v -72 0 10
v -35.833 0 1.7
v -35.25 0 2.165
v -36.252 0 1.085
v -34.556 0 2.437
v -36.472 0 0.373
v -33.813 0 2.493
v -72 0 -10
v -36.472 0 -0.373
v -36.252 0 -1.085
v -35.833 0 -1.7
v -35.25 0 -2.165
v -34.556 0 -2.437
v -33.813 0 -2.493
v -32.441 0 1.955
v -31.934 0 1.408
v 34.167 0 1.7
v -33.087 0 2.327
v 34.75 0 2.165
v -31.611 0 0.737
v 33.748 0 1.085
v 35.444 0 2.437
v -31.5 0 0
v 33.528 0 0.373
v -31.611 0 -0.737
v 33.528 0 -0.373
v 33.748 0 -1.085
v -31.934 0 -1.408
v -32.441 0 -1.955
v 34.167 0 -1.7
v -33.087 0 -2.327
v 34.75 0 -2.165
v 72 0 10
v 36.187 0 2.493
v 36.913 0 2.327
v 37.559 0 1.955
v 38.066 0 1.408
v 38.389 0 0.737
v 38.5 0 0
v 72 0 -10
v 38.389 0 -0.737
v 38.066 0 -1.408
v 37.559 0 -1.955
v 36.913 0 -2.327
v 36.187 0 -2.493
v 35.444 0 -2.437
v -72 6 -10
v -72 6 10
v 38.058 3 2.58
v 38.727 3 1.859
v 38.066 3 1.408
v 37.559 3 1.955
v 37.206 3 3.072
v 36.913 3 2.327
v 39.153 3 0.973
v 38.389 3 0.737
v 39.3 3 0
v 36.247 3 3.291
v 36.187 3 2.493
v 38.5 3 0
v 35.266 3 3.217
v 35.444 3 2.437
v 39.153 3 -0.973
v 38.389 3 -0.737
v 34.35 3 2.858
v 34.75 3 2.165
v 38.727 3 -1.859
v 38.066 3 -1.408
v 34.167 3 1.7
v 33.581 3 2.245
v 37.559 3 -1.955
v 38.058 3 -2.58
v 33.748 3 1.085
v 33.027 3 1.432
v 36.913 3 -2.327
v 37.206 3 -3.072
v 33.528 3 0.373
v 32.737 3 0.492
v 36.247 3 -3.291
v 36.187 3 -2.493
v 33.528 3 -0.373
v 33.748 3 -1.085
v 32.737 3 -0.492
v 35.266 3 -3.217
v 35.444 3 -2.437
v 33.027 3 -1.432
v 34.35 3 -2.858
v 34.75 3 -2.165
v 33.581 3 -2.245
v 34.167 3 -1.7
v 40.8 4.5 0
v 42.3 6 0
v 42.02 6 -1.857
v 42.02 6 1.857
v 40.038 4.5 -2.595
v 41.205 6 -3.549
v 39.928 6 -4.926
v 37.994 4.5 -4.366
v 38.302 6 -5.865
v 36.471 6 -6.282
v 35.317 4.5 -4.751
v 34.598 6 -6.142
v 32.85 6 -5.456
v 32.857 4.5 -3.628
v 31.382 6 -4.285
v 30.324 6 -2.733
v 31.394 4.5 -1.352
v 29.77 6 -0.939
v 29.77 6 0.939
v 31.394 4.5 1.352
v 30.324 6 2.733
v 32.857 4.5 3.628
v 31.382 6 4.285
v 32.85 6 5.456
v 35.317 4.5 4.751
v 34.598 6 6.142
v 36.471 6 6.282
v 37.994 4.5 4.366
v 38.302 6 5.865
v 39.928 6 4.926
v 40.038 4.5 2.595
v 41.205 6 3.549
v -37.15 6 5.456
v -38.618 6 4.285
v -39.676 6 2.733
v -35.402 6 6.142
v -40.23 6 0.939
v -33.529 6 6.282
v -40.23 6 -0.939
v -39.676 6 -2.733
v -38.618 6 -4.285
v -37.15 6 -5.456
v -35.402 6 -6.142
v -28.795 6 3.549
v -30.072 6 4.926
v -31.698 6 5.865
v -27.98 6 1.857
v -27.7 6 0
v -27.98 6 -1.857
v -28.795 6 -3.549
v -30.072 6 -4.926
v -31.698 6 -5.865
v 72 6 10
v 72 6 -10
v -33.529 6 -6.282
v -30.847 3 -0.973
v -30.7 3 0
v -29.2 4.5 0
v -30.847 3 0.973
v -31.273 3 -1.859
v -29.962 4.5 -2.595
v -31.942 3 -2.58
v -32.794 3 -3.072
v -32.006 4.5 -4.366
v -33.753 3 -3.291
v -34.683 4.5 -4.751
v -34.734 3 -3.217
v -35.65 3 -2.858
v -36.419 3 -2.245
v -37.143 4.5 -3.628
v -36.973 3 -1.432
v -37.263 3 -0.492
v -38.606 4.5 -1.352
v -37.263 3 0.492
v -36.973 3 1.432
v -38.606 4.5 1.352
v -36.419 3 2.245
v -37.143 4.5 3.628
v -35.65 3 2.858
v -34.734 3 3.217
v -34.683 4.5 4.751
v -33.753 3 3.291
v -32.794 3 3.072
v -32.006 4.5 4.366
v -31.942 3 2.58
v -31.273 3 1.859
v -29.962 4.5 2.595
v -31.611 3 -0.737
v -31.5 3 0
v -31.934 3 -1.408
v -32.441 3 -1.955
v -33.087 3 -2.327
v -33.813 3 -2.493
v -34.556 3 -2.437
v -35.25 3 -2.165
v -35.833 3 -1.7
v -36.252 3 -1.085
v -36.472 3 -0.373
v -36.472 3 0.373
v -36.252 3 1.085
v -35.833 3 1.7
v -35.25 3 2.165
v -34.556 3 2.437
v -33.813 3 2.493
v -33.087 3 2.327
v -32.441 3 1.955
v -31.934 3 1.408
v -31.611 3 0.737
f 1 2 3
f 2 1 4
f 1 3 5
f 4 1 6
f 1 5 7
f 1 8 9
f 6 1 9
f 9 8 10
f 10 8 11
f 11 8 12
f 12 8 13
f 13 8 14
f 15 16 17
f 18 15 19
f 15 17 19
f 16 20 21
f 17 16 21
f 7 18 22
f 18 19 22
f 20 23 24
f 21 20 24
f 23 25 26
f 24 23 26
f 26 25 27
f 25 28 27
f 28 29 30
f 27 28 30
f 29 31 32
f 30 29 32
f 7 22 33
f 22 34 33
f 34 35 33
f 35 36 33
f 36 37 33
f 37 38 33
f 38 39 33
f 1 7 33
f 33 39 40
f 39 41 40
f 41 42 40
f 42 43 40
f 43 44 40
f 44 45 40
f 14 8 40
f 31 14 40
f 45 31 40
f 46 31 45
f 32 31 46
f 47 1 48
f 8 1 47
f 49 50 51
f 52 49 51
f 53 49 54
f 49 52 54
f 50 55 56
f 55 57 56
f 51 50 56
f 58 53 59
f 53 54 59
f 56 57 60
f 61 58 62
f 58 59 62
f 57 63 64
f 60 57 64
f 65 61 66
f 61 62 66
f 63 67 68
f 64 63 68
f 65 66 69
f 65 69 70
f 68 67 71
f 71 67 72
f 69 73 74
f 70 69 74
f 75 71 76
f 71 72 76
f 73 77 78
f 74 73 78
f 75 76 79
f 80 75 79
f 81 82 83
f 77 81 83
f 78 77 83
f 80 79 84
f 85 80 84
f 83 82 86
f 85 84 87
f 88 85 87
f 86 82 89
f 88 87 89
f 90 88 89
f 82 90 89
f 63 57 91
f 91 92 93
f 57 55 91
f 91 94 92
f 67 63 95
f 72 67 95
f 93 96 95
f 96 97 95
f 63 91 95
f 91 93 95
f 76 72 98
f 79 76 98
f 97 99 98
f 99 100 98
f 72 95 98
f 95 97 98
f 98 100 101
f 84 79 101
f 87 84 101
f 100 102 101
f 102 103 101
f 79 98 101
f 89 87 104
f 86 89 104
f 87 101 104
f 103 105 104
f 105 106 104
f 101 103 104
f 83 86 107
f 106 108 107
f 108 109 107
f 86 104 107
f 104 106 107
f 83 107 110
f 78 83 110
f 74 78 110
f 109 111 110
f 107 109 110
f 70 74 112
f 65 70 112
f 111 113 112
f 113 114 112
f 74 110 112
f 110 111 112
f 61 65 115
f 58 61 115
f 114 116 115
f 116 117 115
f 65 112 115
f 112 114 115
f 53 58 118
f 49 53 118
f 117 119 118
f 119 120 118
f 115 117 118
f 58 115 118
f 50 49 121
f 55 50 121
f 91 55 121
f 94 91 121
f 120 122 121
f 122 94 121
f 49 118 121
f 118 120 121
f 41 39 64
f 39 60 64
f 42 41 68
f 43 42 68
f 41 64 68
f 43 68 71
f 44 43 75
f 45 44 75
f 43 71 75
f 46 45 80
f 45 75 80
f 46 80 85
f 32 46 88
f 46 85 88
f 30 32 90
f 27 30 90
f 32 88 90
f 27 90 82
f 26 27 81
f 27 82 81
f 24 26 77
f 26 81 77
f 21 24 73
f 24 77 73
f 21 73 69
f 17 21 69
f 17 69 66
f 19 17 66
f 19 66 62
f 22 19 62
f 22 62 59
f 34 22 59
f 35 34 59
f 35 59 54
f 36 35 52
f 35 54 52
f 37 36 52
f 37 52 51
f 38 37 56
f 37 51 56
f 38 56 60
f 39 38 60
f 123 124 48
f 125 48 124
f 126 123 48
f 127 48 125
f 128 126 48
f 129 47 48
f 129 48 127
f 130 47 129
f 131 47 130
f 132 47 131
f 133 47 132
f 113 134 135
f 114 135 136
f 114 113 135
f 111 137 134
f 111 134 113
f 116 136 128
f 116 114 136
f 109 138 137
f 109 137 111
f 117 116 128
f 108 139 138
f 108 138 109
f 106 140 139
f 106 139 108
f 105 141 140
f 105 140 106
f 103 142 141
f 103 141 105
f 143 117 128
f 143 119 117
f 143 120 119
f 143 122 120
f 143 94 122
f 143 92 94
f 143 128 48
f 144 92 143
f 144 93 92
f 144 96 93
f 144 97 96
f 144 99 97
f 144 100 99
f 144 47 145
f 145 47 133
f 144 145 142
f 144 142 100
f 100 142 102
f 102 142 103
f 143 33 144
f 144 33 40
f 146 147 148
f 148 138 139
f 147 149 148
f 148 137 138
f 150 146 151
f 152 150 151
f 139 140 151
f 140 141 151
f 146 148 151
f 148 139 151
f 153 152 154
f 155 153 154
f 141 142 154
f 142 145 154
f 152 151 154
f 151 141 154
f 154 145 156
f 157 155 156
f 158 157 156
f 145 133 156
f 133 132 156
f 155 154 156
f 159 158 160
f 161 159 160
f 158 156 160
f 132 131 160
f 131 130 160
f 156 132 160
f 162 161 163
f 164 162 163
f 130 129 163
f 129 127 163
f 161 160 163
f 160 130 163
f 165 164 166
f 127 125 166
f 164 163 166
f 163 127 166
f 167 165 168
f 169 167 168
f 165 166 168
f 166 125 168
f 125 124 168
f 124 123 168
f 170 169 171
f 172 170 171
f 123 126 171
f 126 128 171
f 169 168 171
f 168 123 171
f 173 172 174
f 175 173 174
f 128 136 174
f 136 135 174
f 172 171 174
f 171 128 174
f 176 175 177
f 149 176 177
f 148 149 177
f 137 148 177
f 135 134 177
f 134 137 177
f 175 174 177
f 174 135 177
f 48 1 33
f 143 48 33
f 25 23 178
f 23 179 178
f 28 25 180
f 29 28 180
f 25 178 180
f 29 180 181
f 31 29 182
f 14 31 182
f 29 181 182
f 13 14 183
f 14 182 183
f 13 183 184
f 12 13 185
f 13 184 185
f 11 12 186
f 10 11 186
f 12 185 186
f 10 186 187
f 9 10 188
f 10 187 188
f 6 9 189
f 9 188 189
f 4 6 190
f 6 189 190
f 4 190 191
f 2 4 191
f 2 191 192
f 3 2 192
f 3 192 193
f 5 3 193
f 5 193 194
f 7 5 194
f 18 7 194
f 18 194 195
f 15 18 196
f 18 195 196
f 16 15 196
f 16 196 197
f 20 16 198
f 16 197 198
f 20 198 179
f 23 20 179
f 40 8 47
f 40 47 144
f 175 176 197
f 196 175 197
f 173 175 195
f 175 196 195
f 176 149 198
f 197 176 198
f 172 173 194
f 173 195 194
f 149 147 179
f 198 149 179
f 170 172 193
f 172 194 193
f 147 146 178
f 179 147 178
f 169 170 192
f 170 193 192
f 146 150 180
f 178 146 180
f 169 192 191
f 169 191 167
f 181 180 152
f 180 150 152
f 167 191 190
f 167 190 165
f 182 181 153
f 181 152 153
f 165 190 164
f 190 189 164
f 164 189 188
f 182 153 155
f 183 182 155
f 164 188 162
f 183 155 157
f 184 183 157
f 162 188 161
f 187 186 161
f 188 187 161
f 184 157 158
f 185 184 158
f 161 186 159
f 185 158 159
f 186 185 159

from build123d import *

# Parameters (mm, degrees)
SKETCH1_W           = 144
SKETCH1_H           = 20
BOSS_EXTRUDE1_DEPTH = 6


# Read off the part's stored shape, not the designer's step: AdvancedHole1
with BuildPart() as part:
    # Sketch1 → Boss-Extrude1 (new body)
    with BuildSketch(Plane(origin=(0, 0, 0), x_dir=(1, 0, 0), z_dir=(0, 1, 0))):
        Rectangle(SKETCH1_W, SKETCH1_H)
    extrude(amount=BOSS_EXTRUDE1_DEPTH)

    # AdvancedHole1 outline → AdvancedHole1 (revolve, cut)
    with BuildSketch(Plane(origin=(36, 0, 0), x_dir=(1, 0, 0), z_dir=(0, 0, 1))):
        Polygon((0, 0), (2.5, 0), (2.5, 3), (3.3, 3), (6.3, 6), (0, 6), align=None)
    revolve(axis=Axis((36, 0, 0), (0, 1, 0)), mode=Mode.SUBTRACT)

    # AdvancedHole1 2 outline → AdvancedHole1 2 (revolve, cut)
    with BuildSketch(Plane(origin=(-34, 0, 0), x_dir=(1, 0, 0), z_dir=(0, 0, 1))):
        Polygon((6.3, 6), (0, 6), (0, 0), (2.5, 0), (2.5, 3), (3.3, 3), align=None)
    revolve(axis=Axis((-34, 0, 0), (0, 1, 0)), mode=Mode.SUBTRACT)


solid = part.part
